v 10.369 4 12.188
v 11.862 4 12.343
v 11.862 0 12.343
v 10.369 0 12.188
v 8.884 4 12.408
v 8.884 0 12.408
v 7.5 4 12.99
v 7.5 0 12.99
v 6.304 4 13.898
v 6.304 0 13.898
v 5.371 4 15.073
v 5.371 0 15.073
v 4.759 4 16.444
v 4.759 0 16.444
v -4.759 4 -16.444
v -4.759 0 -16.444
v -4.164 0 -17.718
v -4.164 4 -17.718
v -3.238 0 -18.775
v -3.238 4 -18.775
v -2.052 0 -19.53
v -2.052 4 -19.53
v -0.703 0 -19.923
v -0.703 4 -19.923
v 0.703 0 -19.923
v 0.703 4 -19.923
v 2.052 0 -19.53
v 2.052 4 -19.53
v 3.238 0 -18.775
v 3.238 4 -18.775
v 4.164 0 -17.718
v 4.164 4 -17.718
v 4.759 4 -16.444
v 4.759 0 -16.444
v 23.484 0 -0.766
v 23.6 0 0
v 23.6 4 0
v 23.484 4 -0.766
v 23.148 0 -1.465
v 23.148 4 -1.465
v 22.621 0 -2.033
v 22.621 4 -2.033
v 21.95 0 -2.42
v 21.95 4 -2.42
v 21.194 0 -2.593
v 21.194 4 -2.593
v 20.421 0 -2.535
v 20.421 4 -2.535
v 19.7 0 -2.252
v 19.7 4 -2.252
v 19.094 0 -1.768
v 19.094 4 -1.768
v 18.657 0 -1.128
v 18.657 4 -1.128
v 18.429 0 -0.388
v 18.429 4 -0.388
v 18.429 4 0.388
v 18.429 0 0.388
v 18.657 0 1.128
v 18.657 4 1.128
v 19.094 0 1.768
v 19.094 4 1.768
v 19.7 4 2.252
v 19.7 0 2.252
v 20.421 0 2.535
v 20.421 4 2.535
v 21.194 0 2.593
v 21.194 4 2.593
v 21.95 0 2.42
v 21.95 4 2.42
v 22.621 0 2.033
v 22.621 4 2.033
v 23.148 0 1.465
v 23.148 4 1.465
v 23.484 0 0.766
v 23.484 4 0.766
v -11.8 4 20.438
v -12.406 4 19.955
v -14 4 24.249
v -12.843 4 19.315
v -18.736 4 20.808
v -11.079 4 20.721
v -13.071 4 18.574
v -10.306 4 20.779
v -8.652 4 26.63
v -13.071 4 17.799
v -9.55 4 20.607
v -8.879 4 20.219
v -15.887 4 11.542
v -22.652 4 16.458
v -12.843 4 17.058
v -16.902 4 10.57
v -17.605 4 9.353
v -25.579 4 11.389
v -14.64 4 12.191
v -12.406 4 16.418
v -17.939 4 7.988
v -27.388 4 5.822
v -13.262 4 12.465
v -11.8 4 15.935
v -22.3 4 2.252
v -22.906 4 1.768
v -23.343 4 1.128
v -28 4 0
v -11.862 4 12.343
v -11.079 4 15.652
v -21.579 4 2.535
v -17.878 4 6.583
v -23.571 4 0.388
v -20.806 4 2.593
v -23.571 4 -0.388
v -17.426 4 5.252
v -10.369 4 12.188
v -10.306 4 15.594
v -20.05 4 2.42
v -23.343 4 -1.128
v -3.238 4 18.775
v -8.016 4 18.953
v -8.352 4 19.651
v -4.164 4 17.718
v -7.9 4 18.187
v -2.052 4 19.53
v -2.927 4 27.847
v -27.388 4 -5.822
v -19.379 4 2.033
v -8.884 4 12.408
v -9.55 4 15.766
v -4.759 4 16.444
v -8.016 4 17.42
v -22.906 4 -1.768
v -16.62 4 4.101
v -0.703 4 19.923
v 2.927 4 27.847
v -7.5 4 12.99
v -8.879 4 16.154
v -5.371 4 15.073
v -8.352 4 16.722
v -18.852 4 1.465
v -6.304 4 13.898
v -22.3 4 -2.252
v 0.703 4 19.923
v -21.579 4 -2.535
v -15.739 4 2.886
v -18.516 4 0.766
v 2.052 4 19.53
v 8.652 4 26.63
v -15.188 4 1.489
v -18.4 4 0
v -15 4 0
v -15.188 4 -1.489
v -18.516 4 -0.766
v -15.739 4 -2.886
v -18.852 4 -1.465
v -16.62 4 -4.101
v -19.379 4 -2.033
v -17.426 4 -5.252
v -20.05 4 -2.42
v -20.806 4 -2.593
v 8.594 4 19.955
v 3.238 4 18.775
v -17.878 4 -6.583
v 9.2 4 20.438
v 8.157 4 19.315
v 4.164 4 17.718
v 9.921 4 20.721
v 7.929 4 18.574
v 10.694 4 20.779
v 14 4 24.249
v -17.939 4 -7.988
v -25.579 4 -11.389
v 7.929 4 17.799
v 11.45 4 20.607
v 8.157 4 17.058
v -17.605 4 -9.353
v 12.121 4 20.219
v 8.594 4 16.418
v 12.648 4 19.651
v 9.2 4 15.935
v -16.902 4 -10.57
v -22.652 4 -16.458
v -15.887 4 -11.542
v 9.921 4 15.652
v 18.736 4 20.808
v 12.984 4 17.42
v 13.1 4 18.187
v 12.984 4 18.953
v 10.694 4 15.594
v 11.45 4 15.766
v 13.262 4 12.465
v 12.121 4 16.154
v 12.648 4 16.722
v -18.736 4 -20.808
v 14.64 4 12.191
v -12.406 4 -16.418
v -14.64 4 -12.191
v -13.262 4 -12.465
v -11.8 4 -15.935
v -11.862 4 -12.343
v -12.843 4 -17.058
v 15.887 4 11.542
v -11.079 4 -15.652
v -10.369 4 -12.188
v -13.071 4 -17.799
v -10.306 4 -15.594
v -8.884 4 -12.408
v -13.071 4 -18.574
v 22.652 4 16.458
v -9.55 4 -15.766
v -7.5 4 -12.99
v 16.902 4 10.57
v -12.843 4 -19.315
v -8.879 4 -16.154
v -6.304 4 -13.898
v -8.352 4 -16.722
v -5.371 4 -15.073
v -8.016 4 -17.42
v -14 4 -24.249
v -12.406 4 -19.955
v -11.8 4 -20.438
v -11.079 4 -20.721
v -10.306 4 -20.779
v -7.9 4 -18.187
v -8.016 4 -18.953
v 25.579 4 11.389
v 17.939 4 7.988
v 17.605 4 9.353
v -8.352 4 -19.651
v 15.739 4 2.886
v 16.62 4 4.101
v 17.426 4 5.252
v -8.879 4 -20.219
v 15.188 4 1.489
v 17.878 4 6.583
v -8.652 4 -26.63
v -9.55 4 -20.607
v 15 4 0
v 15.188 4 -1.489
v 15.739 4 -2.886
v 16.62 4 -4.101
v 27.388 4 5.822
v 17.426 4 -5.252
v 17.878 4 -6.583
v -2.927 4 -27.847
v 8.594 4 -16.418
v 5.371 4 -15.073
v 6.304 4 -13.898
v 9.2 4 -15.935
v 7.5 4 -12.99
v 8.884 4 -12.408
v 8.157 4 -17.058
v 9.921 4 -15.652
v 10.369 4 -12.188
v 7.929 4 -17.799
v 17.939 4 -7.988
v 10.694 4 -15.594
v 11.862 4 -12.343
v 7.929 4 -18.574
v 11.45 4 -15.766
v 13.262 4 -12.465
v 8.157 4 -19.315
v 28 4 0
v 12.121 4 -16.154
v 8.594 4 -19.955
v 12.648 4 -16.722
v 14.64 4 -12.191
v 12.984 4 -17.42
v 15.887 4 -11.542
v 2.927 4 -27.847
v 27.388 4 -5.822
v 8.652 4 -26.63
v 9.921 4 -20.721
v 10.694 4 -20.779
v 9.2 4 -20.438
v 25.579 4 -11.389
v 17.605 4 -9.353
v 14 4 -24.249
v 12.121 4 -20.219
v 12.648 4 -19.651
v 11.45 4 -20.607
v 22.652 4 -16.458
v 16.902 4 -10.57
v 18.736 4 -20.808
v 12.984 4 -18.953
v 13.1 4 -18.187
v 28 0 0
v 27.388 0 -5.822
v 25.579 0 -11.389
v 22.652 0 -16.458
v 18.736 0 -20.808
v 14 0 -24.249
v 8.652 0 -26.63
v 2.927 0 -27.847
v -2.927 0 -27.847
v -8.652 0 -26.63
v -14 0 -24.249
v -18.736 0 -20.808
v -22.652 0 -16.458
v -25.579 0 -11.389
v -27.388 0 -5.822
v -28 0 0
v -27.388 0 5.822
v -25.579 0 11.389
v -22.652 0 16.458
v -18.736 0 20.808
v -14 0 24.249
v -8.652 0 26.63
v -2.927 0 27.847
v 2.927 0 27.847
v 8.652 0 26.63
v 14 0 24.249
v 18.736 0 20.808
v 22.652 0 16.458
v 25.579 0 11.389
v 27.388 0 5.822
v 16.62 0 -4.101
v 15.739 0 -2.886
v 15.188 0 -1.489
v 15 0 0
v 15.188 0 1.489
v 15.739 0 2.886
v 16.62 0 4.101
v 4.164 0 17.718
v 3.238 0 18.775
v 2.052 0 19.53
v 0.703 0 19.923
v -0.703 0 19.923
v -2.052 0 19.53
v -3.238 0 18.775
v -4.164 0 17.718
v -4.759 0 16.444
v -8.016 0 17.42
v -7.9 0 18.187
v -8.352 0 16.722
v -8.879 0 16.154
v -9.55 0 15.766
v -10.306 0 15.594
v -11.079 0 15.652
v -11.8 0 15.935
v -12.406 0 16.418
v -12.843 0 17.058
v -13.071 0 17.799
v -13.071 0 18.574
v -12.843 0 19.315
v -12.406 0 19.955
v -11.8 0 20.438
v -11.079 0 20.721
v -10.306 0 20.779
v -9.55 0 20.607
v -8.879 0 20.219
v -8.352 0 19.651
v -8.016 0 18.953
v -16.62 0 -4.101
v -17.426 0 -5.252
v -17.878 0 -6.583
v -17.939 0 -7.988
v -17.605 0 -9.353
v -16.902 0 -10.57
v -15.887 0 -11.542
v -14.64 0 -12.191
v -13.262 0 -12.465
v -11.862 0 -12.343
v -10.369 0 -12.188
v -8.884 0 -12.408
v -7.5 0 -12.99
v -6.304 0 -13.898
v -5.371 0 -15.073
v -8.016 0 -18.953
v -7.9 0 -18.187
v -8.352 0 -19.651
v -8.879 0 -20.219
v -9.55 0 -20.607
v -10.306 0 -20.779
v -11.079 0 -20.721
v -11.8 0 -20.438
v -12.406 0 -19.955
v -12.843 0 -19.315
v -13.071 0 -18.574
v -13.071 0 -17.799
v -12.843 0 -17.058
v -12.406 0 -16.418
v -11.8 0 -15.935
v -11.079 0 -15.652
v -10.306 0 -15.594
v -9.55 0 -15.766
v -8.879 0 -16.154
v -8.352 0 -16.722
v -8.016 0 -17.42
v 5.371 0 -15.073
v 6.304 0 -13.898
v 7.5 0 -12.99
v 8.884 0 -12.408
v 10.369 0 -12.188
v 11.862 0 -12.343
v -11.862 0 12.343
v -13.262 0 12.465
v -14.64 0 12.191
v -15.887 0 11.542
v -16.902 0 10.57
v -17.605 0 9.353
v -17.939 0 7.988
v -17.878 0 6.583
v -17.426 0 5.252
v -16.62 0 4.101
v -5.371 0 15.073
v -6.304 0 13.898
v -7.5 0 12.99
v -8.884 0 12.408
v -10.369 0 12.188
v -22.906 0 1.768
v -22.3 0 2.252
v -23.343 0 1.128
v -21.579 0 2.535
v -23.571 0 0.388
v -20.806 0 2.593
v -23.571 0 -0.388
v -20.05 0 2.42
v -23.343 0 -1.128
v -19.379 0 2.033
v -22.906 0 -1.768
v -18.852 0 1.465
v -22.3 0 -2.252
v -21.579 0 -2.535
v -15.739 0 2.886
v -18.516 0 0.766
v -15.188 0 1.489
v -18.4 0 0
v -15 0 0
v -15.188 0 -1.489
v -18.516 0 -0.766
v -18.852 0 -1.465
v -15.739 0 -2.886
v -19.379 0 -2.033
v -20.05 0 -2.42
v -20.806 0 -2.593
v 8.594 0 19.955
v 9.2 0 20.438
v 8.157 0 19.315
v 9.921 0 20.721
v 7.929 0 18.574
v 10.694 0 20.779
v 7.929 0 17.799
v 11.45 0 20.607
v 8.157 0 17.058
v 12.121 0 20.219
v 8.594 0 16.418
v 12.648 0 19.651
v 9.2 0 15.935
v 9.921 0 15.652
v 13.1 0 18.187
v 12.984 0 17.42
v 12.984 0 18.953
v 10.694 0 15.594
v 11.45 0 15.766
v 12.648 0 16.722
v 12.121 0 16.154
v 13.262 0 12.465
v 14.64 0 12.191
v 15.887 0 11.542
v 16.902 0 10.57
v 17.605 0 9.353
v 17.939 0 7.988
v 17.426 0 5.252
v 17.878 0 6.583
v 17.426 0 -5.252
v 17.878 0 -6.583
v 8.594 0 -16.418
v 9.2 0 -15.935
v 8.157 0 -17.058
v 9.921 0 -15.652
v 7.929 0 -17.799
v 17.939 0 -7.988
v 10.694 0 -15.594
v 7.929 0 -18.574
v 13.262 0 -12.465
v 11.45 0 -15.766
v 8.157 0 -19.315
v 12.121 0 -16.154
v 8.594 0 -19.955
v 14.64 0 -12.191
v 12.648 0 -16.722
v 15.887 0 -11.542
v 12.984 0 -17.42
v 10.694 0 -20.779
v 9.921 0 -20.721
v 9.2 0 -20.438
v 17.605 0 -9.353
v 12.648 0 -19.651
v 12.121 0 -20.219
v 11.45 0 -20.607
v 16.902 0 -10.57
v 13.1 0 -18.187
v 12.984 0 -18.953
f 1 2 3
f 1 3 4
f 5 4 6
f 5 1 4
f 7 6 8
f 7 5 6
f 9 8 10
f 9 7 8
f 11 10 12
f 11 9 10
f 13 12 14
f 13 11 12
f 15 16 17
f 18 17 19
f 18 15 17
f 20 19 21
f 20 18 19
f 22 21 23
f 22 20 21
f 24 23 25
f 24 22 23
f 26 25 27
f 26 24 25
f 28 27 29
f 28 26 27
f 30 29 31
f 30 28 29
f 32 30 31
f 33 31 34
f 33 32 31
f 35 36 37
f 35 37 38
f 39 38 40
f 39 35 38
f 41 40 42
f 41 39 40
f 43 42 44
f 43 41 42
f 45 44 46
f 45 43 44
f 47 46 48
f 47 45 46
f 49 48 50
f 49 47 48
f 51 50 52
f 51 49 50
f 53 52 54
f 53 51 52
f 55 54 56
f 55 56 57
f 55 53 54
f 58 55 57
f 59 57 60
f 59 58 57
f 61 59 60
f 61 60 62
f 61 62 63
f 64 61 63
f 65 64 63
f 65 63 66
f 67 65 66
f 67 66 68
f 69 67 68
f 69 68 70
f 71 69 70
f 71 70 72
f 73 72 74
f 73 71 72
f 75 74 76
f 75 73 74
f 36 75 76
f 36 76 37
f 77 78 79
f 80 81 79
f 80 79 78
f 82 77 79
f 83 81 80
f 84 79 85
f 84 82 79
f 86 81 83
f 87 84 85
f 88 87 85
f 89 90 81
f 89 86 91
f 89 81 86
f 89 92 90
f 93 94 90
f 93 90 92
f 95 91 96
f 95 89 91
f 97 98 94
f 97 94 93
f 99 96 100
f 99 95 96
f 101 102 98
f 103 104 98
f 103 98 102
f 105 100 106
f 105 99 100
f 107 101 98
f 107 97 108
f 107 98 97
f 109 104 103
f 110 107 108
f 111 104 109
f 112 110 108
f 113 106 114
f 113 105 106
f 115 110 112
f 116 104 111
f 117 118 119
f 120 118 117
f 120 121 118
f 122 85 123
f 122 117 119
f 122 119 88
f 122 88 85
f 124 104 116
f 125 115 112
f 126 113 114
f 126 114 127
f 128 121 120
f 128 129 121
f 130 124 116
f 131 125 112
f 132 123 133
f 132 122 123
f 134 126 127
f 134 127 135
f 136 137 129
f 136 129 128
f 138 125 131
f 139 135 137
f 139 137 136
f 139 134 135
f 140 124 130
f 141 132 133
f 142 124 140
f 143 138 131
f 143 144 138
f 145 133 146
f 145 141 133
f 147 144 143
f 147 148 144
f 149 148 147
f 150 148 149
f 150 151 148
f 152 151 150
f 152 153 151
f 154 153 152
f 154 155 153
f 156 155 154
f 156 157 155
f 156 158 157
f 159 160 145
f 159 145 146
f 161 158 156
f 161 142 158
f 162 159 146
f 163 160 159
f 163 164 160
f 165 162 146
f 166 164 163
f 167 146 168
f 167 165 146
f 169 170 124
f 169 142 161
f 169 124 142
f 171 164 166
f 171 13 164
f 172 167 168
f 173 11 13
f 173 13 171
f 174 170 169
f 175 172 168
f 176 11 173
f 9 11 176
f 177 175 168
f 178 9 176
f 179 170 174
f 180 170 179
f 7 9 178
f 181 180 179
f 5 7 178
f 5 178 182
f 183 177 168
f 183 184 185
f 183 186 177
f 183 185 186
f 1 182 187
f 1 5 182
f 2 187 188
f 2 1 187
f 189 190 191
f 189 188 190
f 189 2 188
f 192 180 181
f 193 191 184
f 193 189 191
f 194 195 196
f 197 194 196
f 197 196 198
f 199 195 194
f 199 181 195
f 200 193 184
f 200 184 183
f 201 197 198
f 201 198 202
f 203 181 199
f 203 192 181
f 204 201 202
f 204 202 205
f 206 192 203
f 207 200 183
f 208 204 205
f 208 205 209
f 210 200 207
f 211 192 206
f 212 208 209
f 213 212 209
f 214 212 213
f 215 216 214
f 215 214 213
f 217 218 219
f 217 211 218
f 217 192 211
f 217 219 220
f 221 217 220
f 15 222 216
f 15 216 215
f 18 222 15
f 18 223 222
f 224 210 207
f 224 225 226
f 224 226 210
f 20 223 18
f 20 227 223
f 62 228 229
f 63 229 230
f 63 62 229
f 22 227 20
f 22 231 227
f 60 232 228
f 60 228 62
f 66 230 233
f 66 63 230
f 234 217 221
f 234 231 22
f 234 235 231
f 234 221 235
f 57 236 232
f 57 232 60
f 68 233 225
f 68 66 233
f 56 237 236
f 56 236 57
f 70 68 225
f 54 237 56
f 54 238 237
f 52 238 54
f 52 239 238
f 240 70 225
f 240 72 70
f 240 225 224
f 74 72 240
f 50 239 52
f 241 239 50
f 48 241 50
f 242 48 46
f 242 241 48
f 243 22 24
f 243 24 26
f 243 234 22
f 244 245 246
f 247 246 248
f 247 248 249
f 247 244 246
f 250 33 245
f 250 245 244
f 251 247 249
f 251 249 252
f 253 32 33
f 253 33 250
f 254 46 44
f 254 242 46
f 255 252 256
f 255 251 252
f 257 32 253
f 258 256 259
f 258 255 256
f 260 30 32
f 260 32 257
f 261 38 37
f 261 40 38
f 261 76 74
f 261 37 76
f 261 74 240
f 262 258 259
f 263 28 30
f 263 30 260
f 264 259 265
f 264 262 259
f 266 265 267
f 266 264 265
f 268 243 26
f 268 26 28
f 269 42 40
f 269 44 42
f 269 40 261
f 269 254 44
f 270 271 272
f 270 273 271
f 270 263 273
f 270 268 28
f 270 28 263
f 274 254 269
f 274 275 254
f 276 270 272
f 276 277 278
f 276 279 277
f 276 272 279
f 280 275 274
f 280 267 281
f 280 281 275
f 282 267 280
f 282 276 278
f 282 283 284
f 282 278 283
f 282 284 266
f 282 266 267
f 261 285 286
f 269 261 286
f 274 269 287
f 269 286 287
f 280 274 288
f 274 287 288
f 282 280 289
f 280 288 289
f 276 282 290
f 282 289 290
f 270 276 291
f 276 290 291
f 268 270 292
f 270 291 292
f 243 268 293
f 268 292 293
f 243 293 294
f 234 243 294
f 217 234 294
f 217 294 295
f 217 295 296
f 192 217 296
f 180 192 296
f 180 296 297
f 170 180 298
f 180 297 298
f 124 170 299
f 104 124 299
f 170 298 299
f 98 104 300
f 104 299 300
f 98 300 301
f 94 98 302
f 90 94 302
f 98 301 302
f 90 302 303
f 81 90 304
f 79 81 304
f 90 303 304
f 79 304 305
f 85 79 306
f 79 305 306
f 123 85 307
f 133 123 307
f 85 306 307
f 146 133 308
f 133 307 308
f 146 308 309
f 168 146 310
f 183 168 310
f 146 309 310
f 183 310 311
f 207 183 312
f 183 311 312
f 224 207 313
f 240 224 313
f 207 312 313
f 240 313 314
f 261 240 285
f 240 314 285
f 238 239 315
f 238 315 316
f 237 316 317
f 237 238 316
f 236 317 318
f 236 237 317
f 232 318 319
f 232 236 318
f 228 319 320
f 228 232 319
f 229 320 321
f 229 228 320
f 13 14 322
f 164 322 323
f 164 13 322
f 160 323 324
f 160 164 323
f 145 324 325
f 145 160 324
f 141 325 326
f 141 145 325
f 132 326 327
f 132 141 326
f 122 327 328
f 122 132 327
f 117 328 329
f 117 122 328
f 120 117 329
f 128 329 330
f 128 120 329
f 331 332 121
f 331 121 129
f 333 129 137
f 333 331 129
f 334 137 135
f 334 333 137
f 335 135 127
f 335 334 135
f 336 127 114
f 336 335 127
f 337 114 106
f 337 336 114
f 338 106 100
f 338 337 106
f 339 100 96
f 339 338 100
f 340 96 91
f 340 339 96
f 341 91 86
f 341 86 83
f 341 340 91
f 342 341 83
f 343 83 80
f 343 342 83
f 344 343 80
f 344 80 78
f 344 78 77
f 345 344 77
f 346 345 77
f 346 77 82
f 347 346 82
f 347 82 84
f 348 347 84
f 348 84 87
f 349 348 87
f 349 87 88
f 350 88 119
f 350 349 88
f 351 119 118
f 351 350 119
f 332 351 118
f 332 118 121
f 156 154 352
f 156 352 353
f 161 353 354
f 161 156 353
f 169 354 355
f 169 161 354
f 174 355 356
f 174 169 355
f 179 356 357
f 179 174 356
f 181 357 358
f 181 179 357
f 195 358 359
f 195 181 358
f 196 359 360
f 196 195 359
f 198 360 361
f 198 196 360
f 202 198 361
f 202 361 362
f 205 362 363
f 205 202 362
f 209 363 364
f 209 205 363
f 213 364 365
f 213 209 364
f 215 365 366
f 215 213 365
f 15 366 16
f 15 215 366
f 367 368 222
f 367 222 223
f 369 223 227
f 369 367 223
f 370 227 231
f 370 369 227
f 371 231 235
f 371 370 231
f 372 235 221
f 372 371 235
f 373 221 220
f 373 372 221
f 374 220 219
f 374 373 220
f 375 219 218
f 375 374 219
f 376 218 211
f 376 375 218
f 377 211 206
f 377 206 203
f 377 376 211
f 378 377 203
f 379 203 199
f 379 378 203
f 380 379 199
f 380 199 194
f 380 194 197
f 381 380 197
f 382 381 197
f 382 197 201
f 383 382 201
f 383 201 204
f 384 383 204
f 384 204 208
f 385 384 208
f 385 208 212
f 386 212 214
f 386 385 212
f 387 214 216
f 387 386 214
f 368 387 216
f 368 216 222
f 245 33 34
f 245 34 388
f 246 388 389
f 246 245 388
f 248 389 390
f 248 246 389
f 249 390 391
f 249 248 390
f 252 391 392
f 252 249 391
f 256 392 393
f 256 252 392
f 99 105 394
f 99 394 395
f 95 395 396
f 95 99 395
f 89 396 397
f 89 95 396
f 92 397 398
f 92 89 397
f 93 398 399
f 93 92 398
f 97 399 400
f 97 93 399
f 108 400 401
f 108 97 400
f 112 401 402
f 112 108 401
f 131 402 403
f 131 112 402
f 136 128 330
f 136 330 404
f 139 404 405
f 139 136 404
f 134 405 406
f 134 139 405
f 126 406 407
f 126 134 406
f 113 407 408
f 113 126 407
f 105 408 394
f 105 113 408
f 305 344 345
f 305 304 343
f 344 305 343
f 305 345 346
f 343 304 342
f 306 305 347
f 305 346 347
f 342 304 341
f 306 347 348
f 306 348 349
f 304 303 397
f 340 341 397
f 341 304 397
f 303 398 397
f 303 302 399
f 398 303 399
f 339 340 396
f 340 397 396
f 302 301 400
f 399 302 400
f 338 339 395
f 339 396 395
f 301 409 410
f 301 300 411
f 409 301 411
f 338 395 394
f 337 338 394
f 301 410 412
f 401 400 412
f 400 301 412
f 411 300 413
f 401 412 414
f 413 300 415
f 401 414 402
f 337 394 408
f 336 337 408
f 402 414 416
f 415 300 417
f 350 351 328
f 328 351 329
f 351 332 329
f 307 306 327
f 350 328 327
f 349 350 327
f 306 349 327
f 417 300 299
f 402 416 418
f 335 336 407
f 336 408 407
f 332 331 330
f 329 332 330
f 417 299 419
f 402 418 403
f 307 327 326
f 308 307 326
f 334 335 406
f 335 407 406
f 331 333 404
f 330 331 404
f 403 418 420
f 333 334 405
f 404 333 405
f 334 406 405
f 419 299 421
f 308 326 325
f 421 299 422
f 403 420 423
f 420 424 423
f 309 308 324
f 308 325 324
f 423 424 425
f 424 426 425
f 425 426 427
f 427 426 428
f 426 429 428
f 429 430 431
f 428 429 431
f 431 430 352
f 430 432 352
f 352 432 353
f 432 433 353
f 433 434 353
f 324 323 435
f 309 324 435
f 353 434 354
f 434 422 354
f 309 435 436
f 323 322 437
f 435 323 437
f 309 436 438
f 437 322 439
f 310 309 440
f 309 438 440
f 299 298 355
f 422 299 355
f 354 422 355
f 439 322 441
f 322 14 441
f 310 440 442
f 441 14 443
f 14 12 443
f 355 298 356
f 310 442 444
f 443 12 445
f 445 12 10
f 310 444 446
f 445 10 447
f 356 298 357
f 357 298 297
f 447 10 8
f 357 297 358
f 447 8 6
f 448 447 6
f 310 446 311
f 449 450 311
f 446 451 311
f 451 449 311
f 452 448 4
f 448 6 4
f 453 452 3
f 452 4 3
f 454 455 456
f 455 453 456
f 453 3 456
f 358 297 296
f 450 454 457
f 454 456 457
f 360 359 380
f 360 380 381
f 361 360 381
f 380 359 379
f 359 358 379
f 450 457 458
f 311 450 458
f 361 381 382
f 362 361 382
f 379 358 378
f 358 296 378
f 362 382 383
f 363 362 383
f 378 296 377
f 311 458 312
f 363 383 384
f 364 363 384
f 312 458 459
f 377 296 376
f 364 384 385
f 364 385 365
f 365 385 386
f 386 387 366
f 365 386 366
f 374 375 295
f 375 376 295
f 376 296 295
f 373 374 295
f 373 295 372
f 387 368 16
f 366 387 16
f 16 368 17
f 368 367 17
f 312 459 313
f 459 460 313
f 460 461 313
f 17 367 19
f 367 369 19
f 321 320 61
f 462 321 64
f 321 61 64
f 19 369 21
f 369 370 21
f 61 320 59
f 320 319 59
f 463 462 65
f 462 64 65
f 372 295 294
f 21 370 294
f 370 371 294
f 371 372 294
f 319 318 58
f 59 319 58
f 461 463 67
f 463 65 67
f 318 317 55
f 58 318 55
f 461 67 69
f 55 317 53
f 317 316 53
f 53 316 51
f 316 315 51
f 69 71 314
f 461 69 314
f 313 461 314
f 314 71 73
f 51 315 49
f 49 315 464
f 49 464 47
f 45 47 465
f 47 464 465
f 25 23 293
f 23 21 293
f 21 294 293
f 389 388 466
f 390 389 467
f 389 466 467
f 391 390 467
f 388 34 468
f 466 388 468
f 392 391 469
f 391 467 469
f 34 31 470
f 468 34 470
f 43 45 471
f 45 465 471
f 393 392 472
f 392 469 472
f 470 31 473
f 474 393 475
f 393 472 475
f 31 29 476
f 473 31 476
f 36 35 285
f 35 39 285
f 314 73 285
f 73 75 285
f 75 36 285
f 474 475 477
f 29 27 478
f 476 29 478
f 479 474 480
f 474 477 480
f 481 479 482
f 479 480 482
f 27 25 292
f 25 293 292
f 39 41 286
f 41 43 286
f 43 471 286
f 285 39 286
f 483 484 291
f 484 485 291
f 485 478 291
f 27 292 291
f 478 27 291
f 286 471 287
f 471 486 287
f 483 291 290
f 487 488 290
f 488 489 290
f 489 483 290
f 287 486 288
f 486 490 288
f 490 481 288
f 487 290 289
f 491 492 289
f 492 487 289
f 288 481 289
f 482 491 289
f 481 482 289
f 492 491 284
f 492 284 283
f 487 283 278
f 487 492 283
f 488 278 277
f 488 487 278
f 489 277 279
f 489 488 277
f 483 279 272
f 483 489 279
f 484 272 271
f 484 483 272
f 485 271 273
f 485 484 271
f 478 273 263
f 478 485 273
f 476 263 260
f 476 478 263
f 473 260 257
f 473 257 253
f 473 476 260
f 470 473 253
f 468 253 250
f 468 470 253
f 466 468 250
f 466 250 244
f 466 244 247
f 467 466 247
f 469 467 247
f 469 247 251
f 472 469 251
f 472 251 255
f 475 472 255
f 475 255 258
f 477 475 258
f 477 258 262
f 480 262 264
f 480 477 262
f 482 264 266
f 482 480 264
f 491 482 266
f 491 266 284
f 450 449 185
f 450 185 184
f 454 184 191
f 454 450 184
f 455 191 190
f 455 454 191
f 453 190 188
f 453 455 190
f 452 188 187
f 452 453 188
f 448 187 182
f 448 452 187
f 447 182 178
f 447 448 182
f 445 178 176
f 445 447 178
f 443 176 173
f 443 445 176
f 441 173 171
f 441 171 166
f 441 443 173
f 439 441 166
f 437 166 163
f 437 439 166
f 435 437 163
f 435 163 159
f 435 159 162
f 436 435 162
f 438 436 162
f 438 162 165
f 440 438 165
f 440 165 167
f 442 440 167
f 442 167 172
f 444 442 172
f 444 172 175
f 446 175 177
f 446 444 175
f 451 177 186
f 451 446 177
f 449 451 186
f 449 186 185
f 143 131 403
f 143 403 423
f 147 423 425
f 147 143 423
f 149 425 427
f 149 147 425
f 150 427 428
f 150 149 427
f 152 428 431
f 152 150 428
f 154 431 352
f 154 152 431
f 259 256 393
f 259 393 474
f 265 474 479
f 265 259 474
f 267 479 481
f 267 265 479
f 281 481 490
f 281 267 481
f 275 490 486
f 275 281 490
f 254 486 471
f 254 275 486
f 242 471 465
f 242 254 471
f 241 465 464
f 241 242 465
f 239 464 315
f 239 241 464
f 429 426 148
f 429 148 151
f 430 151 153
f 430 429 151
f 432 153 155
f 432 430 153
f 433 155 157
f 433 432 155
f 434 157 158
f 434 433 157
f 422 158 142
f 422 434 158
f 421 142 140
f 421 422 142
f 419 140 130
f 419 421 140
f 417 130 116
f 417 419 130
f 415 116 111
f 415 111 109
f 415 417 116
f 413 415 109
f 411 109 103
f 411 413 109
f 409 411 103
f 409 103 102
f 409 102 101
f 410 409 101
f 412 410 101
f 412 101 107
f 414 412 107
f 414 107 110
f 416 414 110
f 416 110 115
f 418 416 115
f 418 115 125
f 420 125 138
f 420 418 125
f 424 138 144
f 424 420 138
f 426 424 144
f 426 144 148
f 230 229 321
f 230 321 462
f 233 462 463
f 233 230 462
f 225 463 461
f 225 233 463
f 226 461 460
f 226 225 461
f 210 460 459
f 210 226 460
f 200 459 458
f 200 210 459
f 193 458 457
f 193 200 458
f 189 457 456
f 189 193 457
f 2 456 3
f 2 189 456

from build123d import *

# Parameters (mm, degrees)
SKETCH_1_R               = 28
SKETCH_1_R_2             = 2.6
EXTRUDE_1_DEPTH          = 4
CUT_EXTRUDE_2_DEPTH      = 1
CUT_EXTRUDE_2_DEPTH_BACK = 5


with BuildPart() as part:
    # 草图1 → 凸台-拉伸1 (new body)
    with BuildSketch(Plane(origin=(0, 0, 0), x_dir=(1, 0, 0), z_dir=(0, 1, 0))):
        Circle(SKETCH_1_R)
        with Locations((10.5, 18.186533479)):
            Circle(SKETCH_1_R_2, mode=Mode.SUBTRACT)
        with Locations((21, 0)):
            Circle(SKETCH_1_R_2, mode=Mode.SUBTRACT)
        with Locations((10.5, -18.186533479)):
            Circle(SKETCH_1_R_2, mode=Mode.SUBTRACT)
        with Locations((-10.5, -18.186533479)):
            Circle(SKETCH_1_R_2, mode=Mode.SUBTRACT)
        with Locations((-21, 0)):
            Circle(SKETCH_1_R_2, mode=Mode.SUBTRACT)
        with Locations((-10.5, 18.186533479)):
            Circle(SKETCH_1_R_2, mode=Mode.SUBTRACT)
    extrude(amount=EXTRUDE_1_DEPTH)

    # 草图4 → 切除-拉伸2 (cut, two sides)
    with BuildSketch(Plane(origin=(0, 4, 0), x_dir=(1, 0, 0), z_dir=(0, 1, 0))) as cut_extrude_2_sk:
        with BuildLine():
            ThreePointArc((4.758569662, 16.444127766), (7.4999998, 12.990381172), (11.861747108, 12.343105991))
            ThreePointArc((11.861747108, 12.343105991), (17.29701741, 9.986437924), (16.620317219, 4.10102167))
            ThreePointArc((16.620317219, 4.10102167), (15, 2.31e-07), (16.620316904, -4.101021333))
            ThreePointArc((16.620316904, -4.101021333), (17.297017641, -9.986437525), (11.861747557, -12.343106096))
            ThreePointArc((11.861747557, -12.343106096), (7.5000002, -12.990380941), (4.758569796, -16.444127324))
            ThreePointArc((4.758569796, -16.444127324), (2.31e-07, -19.972875449), (-4.758569662, -16.444127766))
            ThreePointArc((-4.758569662, -16.444127766), (-7.4999998, -12.990381172), (-11.861747108, -12.343105991))
            ThreePointArc((-11.861747108, -12.343105991), (-17.29701741, -9.986437924), (-16.620317219, -4.10102167))
            ThreePointArc((-16.620317219, -4.10102167), (-15, -2.31e-07), (-16.620316904, 4.101021333))
            ThreePointArc((-16.620316904, 4.101021333), (-17.297017641, 9.986437525), (-11.861747557, 12.343106096))
            ThreePointArc((-11.861747557, 12.343106096), (-7.5000002, 12.990380941), (-4.758569796, 16.444127324))
            ThreePointArc((-4.758569796, 16.444127324), (-2.31e-07, 19.972875449), (4.758569662, 16.444127766))
        make_face()
    extrude(amount=CUT_EXTRUDE_2_DEPTH, mode=Mode.SUBTRACT)
    extrude(cut_extrude_2_sk.sketch, amount=-CUT_EXTRUDE_2_DEPTH_BACK, mode=Mode.SUBTRACT)


solid = part.part
